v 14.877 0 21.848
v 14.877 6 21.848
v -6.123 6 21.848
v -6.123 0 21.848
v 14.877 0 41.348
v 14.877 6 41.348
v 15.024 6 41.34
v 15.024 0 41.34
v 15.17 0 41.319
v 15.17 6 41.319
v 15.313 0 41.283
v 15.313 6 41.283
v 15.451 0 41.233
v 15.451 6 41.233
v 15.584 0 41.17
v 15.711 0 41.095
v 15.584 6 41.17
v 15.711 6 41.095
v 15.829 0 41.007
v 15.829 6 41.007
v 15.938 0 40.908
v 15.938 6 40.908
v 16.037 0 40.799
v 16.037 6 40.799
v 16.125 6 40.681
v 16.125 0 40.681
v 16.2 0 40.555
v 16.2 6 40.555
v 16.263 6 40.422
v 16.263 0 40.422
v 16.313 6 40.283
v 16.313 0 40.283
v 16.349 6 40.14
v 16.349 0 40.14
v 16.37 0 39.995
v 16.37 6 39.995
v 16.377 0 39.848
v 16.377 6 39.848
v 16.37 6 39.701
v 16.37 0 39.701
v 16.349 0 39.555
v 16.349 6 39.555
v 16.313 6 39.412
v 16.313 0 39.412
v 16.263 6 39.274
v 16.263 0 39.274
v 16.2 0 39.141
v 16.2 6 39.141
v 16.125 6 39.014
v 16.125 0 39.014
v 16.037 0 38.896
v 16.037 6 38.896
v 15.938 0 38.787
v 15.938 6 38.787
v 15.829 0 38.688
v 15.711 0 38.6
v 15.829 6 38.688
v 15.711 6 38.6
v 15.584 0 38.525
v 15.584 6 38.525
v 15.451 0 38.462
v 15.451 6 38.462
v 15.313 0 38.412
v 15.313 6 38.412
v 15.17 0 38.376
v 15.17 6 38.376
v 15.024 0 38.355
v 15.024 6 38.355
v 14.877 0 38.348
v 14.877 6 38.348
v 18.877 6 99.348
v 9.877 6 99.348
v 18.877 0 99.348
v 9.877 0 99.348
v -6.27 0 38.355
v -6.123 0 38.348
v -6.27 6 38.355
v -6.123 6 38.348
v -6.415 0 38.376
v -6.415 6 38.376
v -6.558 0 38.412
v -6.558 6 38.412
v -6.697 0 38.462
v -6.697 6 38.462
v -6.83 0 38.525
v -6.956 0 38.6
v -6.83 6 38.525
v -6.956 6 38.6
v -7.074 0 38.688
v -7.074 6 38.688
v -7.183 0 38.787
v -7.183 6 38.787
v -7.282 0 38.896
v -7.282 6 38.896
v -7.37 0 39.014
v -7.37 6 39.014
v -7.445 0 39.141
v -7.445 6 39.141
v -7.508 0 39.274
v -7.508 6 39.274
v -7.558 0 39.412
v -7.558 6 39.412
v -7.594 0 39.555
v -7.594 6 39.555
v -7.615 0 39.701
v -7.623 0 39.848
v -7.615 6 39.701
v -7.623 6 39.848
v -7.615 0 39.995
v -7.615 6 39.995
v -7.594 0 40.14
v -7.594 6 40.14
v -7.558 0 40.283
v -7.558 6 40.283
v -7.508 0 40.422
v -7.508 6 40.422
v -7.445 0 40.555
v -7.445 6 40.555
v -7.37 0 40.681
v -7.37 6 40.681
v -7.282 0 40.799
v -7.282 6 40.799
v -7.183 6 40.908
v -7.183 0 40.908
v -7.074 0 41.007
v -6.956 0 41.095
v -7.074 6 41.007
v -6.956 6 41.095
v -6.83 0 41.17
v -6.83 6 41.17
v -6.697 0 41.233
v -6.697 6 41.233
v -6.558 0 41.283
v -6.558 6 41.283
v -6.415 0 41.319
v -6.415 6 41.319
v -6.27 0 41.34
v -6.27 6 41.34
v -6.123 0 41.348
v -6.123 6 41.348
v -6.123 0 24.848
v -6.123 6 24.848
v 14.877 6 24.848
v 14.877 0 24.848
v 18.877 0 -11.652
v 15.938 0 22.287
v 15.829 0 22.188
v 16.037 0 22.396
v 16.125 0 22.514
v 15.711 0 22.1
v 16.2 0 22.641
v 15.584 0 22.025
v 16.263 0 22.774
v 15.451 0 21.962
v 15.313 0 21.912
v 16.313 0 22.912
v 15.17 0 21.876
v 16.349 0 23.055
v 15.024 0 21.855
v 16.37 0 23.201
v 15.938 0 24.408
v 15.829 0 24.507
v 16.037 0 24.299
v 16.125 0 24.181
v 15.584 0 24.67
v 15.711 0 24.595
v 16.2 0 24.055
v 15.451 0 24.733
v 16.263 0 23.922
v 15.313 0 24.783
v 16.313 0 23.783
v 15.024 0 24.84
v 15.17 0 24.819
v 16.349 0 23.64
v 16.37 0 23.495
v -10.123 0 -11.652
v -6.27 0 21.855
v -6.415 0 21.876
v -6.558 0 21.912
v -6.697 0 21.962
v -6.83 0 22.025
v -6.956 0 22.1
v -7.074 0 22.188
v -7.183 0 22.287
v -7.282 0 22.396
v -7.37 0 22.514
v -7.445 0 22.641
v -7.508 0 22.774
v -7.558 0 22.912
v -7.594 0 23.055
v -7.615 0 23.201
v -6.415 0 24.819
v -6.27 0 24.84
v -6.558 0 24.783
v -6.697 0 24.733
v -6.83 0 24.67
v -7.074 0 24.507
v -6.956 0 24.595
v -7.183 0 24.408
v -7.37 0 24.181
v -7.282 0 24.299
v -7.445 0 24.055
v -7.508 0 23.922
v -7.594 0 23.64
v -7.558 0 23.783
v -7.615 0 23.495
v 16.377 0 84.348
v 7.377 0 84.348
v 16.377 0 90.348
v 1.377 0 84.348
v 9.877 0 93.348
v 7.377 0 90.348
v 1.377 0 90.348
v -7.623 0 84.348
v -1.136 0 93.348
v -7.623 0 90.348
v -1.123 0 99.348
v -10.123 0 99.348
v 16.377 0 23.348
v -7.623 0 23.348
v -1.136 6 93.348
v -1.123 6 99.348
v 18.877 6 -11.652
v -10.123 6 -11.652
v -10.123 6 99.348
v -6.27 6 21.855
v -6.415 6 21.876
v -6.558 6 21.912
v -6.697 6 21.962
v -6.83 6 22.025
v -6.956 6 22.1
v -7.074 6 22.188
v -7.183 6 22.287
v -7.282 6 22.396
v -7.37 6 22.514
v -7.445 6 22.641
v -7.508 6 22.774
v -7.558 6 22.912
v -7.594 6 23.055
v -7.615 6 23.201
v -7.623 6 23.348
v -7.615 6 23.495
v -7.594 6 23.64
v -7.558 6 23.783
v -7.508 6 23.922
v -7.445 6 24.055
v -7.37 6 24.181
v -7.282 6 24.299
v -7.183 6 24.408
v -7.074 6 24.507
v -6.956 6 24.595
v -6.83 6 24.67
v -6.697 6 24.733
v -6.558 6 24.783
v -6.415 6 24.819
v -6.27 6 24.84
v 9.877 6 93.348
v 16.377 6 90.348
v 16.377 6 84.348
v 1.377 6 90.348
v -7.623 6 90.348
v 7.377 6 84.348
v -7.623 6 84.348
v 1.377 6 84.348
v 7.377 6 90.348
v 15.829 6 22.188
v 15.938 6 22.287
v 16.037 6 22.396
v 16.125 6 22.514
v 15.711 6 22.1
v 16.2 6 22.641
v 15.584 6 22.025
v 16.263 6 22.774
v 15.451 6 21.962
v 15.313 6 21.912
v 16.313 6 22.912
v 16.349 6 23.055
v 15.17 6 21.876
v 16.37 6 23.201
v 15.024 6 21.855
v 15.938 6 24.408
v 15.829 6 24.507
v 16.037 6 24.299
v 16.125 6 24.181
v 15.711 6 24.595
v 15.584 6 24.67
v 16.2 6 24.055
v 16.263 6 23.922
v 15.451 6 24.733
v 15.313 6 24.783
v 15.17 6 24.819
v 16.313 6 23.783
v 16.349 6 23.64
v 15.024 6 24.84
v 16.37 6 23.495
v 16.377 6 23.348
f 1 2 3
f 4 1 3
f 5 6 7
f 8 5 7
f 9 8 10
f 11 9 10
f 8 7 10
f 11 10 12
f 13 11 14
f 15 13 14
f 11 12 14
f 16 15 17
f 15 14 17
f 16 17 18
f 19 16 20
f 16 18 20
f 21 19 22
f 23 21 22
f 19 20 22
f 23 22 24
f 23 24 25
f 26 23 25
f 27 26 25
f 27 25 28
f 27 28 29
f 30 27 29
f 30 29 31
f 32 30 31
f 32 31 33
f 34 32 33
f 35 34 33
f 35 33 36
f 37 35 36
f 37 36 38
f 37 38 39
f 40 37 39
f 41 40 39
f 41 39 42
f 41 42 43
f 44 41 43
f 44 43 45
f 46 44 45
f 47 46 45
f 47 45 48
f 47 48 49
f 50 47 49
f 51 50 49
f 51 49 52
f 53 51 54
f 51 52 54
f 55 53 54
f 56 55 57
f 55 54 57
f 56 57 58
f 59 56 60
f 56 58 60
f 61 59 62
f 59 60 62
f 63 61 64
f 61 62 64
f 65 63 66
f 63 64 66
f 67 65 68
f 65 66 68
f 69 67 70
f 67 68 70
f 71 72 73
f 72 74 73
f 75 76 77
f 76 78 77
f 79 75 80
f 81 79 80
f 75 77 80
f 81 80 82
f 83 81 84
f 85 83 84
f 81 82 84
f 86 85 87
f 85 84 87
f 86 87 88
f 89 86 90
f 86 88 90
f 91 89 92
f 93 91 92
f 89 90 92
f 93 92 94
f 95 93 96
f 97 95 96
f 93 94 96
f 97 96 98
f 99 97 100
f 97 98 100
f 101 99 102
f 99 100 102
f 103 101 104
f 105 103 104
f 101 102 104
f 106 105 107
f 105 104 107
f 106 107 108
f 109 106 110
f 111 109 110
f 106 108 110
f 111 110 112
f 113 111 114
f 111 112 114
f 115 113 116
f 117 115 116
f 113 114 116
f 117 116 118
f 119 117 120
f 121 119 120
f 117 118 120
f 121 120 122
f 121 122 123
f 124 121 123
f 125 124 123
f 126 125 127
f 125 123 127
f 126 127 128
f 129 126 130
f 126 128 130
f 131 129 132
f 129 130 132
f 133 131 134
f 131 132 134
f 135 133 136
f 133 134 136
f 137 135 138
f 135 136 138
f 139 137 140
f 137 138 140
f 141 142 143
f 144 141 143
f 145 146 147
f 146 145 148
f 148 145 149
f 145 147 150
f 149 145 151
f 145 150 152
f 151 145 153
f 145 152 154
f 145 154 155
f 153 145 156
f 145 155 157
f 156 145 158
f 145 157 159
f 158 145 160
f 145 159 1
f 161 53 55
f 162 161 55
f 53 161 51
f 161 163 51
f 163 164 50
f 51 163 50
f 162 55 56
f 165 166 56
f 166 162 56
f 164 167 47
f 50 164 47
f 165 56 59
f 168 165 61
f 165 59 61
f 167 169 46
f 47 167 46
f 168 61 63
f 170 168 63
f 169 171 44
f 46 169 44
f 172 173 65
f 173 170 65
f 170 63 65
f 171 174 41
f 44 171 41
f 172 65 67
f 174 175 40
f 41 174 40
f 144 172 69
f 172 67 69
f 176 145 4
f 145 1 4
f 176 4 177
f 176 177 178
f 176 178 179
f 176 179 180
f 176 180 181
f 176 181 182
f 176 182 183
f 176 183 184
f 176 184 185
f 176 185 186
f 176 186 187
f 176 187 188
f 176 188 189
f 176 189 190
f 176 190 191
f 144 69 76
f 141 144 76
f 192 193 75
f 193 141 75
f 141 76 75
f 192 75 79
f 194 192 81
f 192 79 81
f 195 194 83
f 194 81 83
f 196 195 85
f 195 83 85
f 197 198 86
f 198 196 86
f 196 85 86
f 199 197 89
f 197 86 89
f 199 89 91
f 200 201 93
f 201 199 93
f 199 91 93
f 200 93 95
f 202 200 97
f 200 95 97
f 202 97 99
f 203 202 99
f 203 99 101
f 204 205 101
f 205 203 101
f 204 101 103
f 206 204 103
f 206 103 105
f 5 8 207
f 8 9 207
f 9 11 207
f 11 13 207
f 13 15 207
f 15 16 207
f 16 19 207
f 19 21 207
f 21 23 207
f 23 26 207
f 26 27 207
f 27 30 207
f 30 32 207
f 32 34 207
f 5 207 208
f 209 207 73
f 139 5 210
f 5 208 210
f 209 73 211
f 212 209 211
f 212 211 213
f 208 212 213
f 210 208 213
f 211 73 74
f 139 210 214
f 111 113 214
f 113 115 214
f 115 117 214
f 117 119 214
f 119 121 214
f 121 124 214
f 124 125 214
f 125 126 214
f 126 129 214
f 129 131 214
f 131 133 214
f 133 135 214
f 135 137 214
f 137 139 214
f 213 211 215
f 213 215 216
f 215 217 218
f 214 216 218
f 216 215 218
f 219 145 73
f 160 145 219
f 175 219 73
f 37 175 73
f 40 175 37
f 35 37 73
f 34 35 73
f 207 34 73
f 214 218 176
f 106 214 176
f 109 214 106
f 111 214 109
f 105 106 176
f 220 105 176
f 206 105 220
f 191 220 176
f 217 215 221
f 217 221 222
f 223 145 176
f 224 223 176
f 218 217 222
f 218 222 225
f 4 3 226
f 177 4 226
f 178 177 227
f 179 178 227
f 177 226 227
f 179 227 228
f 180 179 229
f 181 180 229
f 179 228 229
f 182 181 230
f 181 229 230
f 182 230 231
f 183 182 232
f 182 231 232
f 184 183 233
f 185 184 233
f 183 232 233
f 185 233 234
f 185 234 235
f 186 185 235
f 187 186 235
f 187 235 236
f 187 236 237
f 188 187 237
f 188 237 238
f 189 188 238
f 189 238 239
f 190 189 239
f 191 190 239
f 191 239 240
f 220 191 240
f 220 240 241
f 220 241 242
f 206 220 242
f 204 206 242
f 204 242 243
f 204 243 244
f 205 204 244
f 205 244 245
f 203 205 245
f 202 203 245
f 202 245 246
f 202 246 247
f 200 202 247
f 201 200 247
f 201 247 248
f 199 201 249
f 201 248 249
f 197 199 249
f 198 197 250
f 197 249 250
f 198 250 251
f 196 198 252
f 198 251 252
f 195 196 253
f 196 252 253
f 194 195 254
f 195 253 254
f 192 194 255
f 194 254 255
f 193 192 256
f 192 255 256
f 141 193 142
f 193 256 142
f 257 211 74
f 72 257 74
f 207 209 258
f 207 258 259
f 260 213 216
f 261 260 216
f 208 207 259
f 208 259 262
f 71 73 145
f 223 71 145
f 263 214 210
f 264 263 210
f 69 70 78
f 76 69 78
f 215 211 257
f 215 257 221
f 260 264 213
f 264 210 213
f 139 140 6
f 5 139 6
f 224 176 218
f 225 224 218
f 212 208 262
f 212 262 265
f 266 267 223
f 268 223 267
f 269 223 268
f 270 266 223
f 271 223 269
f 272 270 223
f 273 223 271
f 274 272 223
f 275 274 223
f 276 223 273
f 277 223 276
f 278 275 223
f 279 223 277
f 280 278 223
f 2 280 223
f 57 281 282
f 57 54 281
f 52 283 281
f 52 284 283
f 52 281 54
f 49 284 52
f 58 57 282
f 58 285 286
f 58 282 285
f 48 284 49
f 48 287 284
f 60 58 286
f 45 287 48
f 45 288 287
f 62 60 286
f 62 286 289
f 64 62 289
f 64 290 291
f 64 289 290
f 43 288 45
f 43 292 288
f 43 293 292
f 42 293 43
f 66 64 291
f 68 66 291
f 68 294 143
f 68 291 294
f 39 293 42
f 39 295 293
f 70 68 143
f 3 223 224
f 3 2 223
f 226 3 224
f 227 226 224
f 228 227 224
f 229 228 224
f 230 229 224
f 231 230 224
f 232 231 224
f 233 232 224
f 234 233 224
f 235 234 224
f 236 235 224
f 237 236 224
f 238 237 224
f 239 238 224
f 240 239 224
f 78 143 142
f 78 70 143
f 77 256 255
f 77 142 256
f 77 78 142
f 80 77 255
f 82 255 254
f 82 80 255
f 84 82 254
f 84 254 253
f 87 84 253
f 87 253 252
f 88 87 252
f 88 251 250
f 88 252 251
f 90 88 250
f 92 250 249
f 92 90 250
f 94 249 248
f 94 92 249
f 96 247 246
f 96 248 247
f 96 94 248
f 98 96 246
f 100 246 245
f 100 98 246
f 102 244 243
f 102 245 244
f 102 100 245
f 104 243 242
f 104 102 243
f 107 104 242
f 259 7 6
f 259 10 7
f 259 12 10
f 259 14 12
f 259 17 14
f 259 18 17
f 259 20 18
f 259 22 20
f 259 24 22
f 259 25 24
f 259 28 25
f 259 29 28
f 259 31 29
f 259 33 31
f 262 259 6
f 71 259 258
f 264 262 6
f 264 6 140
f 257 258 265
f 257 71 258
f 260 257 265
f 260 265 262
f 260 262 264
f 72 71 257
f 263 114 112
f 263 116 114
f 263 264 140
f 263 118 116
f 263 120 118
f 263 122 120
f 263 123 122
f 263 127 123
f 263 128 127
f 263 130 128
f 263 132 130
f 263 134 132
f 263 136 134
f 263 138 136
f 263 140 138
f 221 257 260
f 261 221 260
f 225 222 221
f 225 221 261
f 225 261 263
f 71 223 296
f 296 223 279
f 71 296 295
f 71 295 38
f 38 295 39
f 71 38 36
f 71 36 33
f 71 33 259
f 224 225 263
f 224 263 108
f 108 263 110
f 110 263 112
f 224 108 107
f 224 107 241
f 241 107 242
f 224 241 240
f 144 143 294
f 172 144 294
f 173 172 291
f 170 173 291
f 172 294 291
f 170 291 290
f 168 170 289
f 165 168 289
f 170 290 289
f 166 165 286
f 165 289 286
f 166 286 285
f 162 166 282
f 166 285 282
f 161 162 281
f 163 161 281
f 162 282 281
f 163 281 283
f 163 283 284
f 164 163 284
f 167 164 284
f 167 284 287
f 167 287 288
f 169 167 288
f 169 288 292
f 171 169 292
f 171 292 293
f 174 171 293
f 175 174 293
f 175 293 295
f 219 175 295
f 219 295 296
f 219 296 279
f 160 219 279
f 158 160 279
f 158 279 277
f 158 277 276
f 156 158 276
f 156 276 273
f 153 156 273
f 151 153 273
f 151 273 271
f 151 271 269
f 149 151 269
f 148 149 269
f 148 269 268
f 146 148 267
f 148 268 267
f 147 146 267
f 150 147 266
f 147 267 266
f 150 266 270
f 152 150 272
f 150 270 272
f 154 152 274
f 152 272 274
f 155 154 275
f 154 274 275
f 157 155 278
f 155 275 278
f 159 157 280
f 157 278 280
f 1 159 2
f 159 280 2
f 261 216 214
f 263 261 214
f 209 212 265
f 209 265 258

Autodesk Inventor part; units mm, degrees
ref_plane "YZ Plane" through (0, 0, 0) normal (1, 0, 0) x (0, 1, 0)
ref_plane "XZ Plane" through (0, 0, 0) normal (0, 1, 0) x (-1, 0, 0)
ref_plane "XY Plane" through (0, 0, 0) normal (0, 0, 1) x (1, 0, 0)
sketch "Sketch1" plane through (0, 0, 0) normal (0, 1, 0) x (-1, 0, 0)
  line L0 (10.1226, -11.6524) -> (10.1226, 93.3476)
  line L1 (-18.8774, 93.3476) -> (-18.8774, -11.6524)
  line L2 (-18.8774, -11.6524) -> (-4.3774, -11.6524)
  line L3 (-4.3774, -11.6524) -> (-4.3774, 93.3476) construction
  line L4 (-18.8774, 40.8476) -> (-4.3774, 40.8476) construction
  line L5 (-18.8774, 93.3476) -> (10.1226, 93.3476)
  line L6 (-18.8774, 93.3476) -> (-9.8774, 93.3476)
  line L7 (-9.8774, 93.3476) -> (-9.8774, 99.3476)
  line L8 (-9.8774, 99.3476) -> (-18.8774, 99.3476)
  line L9 (-18.8774, 99.3476) -> (-18.8774, 93.3476)
  line L10 (10.1226, 93.3476) -> (1.1357, 93.3476)
  line L11 (1.1357, 93.3476) -> (1.1226, 99.3476)
  line L12 (1.1226, 99.3476) -> (10.1226, 99.3476)
  line L13 (10.1226, 99.3476) -> (10.1226, 93.3476)
  line L14 (-4.3774, 40.8476) -> (10.1226, 40.8476) construction
  line L15 (-4.3774, -11.6524) -> (10.1226, -11.6524)
  line L16 (-7.3774, 90.3476) -> (-16.3774, 90.3476)
  line L17 (-16.3774, 90.3476) -> (-16.3774, 84.3476)
  line L18 (-16.3774, 84.3476) -> (-7.3774, 84.3476)
  line L19 (-7.3774, 84.3476) -> (-7.3774, 90.3476)
  line L20 (-7.3774, 90.3476) -> (-16.3774, 84.3476) construction
  line L21 (-16.3774, 90.3476) -> (-7.3774, 84.3476) construction
  line L22 (-1.3774, 90.3476) -> (7.6226, 90.3476)
  line L23 (7.6226, 90.3476) -> (7.6226, 84.3476)
  line L24 (7.6226, 84.3476) -> (-1.3774, 84.3476)
  line L25 (-1.3774, 84.3476) -> (-1.3774, 90.3476)
  line L26 (-1.3774, 90.3476) -> (7.6226, 84.3476) construction
  line L27 (7.6226, 90.3476) -> (-1.3774, 84.3476) construction
  point P0 (-11.8774, 87.3476)
  point P1 (3.1226, 87.3476)
  dimension "d0" = 29
  dimension "d1" = 105
  dimension "d18" = 9
  dimension "d19" = 6
  dimension "d20" = 14.5
  dimension "d21" = 9
  dimension "d22" = 6
  dimension "d23" = 3
  dimension "d44" = 6
extrude "Extrusion1" add sketch "Sketch1" along normal blind 6
sketch "Sketch2" plane through (0, 6, 0) normal (0, 1, 0) x (1, 0, 0)
  line L0 (12.8733, -39.8476) -> (-6.1226, -39.8476) construction
  line L1 (-1.1357, -93.3476) -> (9.8774, -93.3476) construction
  line L2 (14.8774, -23.3476) -> (-6.1226, -23.3476) construction
  line L3 (14.8774, -21.8476) -> (-6.1226, -21.8476)
  line L4 (-6.1226, -24.8476) -> (14.8774, -24.8476)
  arc A0 (14.8774, -24.8476) -> (14.8774, -21.8476) centre (14.8774, -23.3476) ccw
  arc A1 (-6.1226, -21.8476) -> (-6.1226, -24.8476) centre (-6.1226, -23.3476) ccw
  line L5 (14.8774, -39.8476) -> (-6.1226, -39.8476) construction
  line L6 (14.8774, -38.3476) -> (-6.1226, -38.3476)
  line L7 (-6.1226, -41.3476) -> (14.8774, -41.3476)
  arc A2 (14.8774, -41.3476) -> (14.8774, -38.3476) centre (14.8774, -39.8476) ccw
  arc A3 (-6.1226, -38.3476) -> (-6.1226, -41.3476) centre (-6.1226, -39.8476) ccw
  line L8 (14.8774, -39.8476) -> (14.8774, -23.3476) construction
  line L9 (18.8774, -99.3476) -> (18.8774, 11.6524) construction
  line L10 (-10.1226, 11.6524) -> (-10.1226, -99.3476) construction
  line L11 (-6.1226, -39.8476) -> (-6.1226, -23.3476) construction
  point P0 (0, 0)
  point P1 (4.3747, -31.5976)
  point P2 (4.3774, -23.3476)
  point P3 (4.3774, -39.8476)
  point P4 (-6.1226, -31.5976)
  dimension "d46" = 3
  dimension "d47" = 3
  dimension "d48" = 16.5
  dimension "d49" = 70
  dimension "d50" = 4
  dimension "d51" = 4
extrude "Extrusion2" cut sketch "Sketch2" against normal through all
equation "\"d47\" = d46"
equation "\"d51\" = d50"
properties part number "thumper-bumper-sidewall-v3"
